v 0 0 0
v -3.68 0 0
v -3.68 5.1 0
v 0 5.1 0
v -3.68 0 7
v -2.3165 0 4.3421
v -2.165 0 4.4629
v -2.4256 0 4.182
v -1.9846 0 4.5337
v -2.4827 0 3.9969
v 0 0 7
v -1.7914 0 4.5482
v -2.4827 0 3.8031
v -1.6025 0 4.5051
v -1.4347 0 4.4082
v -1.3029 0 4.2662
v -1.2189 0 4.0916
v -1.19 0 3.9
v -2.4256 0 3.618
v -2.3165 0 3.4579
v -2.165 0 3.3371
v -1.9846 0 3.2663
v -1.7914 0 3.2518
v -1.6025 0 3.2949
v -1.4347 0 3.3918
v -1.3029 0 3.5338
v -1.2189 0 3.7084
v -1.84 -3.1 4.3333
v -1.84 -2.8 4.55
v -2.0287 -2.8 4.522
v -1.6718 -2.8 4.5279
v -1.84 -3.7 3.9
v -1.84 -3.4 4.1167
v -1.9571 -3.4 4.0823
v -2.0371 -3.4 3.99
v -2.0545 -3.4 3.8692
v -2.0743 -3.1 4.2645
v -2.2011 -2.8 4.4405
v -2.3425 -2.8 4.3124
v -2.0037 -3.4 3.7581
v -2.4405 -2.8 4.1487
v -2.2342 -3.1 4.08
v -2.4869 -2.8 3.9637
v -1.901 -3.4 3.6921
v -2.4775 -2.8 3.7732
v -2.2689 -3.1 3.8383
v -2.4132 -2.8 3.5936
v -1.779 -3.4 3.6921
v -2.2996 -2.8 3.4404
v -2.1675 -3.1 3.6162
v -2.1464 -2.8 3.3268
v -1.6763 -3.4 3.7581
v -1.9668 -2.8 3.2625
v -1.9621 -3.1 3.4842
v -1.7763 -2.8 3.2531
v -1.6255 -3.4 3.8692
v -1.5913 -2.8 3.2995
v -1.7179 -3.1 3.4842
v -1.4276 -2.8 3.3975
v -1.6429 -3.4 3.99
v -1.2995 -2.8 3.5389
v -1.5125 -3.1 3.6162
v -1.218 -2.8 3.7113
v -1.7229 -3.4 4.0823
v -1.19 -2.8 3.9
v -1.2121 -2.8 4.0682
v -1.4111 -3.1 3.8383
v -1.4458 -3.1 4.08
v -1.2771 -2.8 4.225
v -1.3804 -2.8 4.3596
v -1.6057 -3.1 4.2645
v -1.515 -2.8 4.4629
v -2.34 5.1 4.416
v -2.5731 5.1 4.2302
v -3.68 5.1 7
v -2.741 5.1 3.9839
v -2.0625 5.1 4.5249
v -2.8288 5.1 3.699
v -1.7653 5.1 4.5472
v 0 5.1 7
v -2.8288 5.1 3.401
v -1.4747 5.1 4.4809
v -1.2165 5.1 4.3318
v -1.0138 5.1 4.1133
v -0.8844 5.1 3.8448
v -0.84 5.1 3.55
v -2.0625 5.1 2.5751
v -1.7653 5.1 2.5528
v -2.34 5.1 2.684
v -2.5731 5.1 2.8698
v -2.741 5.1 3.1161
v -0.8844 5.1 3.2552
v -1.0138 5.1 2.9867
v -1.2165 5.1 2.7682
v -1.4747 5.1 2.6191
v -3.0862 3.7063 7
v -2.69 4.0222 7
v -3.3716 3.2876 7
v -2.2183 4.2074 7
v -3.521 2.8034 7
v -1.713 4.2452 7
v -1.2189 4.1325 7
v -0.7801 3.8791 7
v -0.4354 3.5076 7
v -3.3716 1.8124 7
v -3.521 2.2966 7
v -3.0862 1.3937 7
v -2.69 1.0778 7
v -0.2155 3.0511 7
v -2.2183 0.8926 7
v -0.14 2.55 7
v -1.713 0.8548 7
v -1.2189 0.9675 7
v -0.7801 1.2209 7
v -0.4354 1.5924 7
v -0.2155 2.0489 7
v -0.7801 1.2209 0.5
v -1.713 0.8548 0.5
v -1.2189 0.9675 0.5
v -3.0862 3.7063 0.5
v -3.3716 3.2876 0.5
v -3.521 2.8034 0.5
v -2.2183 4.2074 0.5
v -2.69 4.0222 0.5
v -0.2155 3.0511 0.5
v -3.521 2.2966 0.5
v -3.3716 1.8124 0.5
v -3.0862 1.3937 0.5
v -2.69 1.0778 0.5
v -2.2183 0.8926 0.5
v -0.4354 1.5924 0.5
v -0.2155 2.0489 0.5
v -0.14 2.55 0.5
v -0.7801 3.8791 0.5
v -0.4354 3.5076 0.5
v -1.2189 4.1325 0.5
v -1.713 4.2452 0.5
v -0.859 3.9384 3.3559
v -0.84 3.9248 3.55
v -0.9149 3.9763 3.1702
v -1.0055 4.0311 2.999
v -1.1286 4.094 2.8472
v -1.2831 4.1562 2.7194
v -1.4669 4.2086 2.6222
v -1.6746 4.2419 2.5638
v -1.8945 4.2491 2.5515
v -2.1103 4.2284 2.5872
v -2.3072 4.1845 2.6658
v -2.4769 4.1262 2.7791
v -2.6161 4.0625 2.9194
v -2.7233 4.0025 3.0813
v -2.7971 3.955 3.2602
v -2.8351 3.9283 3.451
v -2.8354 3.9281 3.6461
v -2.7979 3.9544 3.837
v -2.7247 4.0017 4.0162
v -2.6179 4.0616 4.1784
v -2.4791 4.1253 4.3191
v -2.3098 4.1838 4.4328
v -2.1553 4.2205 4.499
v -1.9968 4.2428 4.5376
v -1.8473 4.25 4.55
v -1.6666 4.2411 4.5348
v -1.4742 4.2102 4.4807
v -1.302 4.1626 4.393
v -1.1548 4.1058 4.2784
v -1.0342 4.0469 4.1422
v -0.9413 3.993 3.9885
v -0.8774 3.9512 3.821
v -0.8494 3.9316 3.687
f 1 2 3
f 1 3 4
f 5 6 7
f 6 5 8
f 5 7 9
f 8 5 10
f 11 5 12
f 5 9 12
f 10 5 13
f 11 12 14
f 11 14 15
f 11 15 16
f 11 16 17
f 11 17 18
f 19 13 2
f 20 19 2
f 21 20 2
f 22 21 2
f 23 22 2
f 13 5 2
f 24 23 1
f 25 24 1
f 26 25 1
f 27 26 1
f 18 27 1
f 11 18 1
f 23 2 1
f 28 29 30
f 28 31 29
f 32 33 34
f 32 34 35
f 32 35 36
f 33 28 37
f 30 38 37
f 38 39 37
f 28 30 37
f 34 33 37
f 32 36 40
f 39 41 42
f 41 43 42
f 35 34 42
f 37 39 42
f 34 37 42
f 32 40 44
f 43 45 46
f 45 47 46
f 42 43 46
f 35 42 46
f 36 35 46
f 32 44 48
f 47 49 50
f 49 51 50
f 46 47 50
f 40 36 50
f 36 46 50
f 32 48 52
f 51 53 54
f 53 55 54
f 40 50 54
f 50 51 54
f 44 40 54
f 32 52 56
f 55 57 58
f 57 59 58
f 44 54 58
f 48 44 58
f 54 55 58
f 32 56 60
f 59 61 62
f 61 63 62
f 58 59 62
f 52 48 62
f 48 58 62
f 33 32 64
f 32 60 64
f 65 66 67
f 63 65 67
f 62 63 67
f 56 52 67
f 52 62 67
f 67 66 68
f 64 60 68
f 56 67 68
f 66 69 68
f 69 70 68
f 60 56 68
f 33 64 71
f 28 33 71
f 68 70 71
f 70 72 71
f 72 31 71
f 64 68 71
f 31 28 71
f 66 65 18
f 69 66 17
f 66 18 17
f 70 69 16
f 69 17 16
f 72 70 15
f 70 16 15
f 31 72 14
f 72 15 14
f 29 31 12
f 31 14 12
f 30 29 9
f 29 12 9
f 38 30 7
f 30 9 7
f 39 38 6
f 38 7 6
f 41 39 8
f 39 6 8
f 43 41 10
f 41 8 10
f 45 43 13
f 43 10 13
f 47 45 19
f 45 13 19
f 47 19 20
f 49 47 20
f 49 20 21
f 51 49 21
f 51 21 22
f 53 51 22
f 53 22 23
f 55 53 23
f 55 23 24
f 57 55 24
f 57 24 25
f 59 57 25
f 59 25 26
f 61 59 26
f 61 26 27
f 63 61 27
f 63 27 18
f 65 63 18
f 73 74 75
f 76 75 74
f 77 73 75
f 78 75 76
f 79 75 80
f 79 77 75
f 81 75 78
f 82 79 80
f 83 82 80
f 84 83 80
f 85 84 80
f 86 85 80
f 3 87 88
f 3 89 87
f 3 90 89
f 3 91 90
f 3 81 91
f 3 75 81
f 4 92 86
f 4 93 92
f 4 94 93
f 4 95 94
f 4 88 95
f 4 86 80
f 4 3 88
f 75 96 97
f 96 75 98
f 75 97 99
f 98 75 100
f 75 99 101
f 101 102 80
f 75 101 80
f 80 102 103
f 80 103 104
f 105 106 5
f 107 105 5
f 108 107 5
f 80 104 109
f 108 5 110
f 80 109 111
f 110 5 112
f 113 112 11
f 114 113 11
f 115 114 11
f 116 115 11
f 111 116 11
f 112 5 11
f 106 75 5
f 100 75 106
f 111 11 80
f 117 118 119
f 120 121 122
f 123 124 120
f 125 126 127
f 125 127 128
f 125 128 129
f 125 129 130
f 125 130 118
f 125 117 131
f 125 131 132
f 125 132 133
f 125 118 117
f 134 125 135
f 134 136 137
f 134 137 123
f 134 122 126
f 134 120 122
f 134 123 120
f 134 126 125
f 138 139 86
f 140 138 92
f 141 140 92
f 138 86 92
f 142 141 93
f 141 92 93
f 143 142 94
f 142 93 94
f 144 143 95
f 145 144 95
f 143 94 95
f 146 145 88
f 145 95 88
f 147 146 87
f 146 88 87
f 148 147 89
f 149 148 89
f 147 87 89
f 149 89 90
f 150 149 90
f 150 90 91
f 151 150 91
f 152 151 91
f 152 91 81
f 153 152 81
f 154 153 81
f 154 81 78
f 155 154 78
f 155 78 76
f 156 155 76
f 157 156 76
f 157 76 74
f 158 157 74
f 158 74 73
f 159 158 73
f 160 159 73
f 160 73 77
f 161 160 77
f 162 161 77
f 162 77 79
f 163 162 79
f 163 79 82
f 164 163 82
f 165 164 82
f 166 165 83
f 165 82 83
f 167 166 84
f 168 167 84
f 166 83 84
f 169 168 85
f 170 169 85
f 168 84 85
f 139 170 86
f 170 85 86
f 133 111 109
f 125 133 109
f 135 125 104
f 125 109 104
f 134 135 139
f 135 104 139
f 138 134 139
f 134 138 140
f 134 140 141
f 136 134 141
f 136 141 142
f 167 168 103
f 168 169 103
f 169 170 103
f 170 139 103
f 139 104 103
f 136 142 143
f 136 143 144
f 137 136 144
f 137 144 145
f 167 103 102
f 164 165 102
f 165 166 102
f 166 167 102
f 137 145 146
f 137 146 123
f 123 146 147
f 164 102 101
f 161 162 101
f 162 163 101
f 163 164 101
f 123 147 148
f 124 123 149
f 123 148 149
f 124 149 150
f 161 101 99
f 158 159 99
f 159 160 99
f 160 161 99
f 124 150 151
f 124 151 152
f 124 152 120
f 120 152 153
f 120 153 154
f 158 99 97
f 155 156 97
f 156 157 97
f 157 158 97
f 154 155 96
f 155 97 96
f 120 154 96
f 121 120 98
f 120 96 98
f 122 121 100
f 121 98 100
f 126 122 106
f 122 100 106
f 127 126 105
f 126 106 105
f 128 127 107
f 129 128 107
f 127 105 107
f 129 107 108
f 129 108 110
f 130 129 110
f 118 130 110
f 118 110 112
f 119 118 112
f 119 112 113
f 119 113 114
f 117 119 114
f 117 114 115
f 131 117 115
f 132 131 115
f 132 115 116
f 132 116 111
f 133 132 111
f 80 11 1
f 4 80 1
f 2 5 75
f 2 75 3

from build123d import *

# Parameters (mm, degrees)
SKETCH1_W           = 3.68
SKETCH1_H           = 7
BOSS_EXTRUDE1_DEPTH = 5.1
SKETCH2_R           = 1.7
CUT_EXTRUDE1_DEPTH  = 6.5
SKETCH3_R           = 0.65
BOSS_EXTRUDE2_DEPTH = 2.8
CUT_EXTRUDE2_REACH  = 9.9
SKETCH4_R           = 1


with BuildPart() as part:
    # Sketch1 → Boss-Extrude1 (new body)
    with BuildSketch(Plane(origin=(0, 0, 0), x_dir=(1, 0, 0), z_dir=(0, 1, 0))):
        with Locations((-1.84, -3.5)):
            Rectangle(SKETCH1_W, SKETCH1_H)
    extrude(amount=BOSS_EXTRUDE1_DEPTH)

    # Sketch2 → Cut-Extrude1 (cut)
    with BuildSketch(Plane.XY.offset(7)):
        with Locations((-1.84, 2.55)):
            Circle(SKETCH2_R)
    extrude(amount=-CUT_EXTRUDE1_DEPTH, mode=Mode.SUBTRACT)

    # Sketch3 → Boss-Extrude2 (add)
    with BuildSketch(Plane.XZ):
        with Locations((-1.84, 3.9)):
            Circle(SKETCH3_R)
    extrude(amount=BOSS_EXTRUDE2_DEPTH)

    # Sketch4 → Cut-Extrude2 (cut, up to next)
    with BuildSketch(Plane(origin=(0, 5.1, 0), x_dir=(1, 0, 0), z_dir=(0, 1, 0)), mode=Mode.PRIVATE) as cut_extrude2_sk1:
        with Locations((-1.84, -3.55)):
            Circle(SKETCH4_R)
    cut_extrude2_tool1 = extrude(cut_extrude2_sk1.sketch, amount=-CUT_EXTRUDE2_REACH, mode=Mode.PRIVATE) & part.part
    add(cut_extrude2_tool1.solids().sort_by_distance((-1.84, 5.1, 3.55))[0], mode=Mode.SUBTRACT)

    # Sketch7 → Revolve2 (revolve)
    with BuildSketch(Plane(origin=(-1.84, 0, 0), x_dir=(0, 0, -1), z_dir=(1, 0, 0))):
        Polygon((-3.9, -2.8), (-3.9, -3.7), (-4.55, -2.8), align=None)
    revolve(axis=Axis((-1.84, -2.8, 3.9), (0, -1, 0)))


solid = part.part
